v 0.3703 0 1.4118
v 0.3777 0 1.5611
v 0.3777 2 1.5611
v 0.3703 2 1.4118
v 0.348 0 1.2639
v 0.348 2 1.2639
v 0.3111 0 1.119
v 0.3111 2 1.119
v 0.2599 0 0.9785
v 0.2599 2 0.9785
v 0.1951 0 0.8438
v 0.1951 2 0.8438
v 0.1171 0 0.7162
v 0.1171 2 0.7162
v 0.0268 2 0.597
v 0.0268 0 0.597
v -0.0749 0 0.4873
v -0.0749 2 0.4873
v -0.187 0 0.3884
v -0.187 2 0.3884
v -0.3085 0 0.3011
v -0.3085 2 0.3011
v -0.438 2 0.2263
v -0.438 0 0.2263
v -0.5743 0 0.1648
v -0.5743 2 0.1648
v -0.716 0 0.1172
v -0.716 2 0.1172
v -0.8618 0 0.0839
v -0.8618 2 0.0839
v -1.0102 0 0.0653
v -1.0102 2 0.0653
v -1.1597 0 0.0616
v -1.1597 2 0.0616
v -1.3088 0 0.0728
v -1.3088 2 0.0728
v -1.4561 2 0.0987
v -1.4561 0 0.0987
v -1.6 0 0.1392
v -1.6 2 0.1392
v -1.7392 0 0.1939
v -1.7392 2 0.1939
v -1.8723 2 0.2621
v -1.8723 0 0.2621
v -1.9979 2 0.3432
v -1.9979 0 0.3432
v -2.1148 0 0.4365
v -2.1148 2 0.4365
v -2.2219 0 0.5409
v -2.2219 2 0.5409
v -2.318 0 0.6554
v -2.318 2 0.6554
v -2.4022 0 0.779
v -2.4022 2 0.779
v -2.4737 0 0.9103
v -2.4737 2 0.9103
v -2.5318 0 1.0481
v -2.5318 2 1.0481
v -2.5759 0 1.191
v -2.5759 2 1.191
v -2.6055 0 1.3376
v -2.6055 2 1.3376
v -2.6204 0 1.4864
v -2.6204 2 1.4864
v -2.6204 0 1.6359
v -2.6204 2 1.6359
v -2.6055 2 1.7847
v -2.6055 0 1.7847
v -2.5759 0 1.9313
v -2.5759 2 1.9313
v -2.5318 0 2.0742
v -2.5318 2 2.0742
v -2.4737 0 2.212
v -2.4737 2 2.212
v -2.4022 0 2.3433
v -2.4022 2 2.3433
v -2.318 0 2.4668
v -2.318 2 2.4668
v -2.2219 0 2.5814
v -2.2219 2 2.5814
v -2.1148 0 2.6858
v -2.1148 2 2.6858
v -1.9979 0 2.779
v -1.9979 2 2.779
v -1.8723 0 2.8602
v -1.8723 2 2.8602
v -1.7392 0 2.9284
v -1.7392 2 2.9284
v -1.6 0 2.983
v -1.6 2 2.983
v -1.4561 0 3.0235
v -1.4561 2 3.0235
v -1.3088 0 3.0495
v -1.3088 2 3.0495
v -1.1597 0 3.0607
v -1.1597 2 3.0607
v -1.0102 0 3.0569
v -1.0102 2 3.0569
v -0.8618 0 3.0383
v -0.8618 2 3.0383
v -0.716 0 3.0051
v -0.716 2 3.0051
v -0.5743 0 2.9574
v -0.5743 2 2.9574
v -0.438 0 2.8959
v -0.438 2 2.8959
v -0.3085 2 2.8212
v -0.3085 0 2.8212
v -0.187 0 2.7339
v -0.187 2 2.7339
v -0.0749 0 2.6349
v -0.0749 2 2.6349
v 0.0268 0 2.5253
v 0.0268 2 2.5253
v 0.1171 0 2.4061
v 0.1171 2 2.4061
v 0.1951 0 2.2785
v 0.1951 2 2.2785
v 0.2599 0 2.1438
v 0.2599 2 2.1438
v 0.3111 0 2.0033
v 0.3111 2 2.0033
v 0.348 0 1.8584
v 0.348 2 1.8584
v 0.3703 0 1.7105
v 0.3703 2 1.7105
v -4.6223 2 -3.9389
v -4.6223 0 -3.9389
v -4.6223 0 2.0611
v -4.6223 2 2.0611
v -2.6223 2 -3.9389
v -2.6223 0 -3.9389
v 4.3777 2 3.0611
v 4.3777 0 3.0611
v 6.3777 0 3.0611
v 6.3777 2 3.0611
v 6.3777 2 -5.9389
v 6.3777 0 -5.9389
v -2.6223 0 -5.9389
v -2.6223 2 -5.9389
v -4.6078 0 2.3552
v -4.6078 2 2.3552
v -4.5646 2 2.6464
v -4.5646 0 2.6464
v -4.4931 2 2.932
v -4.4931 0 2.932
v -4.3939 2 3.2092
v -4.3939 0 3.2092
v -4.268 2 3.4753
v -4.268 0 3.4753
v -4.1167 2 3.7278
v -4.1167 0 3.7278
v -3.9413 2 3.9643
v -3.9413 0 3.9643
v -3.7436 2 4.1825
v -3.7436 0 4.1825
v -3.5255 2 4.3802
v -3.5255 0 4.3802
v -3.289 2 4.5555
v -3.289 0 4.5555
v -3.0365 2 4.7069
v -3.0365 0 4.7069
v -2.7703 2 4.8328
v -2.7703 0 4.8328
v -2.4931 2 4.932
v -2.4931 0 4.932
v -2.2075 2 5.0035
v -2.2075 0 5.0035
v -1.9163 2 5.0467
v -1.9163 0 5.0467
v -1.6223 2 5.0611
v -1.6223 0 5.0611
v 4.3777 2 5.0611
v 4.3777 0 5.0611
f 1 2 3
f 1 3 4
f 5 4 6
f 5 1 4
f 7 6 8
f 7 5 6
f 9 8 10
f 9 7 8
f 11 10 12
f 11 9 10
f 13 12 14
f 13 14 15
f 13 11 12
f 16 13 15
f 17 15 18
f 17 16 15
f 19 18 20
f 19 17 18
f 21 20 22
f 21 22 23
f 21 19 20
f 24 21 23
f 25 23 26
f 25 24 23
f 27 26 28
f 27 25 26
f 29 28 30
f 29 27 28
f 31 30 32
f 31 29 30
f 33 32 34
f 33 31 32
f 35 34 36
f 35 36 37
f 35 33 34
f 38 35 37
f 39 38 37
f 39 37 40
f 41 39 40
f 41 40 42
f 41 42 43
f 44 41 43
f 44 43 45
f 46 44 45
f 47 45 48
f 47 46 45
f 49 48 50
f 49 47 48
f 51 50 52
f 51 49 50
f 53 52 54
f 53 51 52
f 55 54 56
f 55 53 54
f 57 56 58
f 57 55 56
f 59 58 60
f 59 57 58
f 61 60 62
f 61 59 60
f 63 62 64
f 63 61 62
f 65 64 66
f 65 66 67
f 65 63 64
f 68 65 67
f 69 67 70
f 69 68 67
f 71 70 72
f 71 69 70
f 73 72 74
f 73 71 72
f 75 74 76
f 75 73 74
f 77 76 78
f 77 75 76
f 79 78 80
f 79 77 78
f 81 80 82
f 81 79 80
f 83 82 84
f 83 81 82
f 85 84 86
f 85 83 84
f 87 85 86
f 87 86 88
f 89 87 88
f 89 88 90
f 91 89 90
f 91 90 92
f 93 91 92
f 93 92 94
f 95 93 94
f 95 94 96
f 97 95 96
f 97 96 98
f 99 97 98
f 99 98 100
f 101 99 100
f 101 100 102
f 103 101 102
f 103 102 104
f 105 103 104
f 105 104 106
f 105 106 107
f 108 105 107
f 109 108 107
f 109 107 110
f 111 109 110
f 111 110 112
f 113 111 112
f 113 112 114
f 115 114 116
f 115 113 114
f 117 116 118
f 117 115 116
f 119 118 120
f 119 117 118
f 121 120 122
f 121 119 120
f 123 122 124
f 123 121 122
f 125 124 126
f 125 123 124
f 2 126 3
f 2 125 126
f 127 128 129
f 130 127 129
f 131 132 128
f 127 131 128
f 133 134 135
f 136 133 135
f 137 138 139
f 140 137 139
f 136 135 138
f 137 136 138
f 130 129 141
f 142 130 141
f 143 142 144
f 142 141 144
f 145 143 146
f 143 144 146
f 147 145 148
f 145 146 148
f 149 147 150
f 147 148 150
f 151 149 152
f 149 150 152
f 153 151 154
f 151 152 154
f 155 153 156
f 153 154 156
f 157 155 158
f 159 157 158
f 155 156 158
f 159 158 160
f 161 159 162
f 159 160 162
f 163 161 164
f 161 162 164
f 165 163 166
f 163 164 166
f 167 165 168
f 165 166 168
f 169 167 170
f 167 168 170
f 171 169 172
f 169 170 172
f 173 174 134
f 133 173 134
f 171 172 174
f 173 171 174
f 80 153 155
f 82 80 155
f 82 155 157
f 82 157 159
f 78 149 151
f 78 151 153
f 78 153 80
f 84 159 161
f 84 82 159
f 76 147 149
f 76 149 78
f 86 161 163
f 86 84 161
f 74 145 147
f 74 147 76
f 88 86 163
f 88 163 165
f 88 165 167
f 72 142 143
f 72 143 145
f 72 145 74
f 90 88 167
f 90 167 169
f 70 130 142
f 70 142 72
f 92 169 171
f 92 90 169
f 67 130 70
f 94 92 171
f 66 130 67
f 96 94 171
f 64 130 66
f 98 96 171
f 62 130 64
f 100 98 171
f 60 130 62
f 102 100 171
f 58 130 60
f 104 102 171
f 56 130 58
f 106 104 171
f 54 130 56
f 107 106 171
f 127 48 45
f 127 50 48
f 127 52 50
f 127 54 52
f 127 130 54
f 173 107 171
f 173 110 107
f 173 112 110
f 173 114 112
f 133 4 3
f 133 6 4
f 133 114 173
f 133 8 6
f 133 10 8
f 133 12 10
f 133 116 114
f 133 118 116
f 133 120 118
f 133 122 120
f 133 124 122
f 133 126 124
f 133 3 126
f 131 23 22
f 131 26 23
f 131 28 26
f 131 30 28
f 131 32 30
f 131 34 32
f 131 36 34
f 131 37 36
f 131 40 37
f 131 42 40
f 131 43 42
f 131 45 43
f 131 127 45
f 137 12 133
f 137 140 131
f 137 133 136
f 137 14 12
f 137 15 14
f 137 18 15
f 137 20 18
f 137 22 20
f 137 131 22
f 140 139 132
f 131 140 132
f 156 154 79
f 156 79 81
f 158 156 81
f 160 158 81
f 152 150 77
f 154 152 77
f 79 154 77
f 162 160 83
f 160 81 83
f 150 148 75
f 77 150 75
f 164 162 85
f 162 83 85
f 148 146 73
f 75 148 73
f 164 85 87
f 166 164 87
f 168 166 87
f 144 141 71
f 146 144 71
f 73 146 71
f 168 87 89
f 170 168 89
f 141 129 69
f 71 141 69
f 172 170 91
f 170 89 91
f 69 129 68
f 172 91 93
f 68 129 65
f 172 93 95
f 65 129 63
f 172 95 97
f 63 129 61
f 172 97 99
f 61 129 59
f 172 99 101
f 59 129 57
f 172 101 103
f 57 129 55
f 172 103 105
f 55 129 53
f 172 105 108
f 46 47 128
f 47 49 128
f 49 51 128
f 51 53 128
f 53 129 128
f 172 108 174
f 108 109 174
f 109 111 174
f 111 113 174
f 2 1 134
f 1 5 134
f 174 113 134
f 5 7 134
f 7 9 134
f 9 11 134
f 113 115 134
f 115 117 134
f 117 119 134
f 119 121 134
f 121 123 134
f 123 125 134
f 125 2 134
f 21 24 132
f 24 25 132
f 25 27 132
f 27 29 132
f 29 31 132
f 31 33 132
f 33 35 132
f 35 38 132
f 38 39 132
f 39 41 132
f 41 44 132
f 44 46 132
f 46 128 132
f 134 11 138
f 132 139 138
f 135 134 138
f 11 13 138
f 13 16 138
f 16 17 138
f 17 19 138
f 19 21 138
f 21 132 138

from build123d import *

# Parameters (mm, degrees)
SKETCH1_R           = 1.5
BOSS_EXTRUDE1_DEPTH = 2


with BuildPart() as part:
    # Sketch1 → Boss-Extrude1 (new body)
    with BuildSketch(Plane(origin=(0, 0, 0), x_dir=(1, 0, 0), z_dir=(0, 1, 0))):
        with BuildLine():
            Line((6.37772525, 5.938862625), (-2.62227475, 5.938862625))
            Line((-2.62227475, 5.938862625), (-2.62227475, 3.938862625))
            Line((-2.62227475, 3.938862625), (-4.62227475, 3.938862625))
            Line((-4.62227475, 3.938862625), (-4.62227475, -2.061137375))
            ThreePointArc((-4.62227475, -2.061137375), (-3.743595093, -4.182457719), (-1.62227475, -5.061137375))
            Line((-1.62227475, -5.061137375), (4.37772525, -5.061137375))
            Line((4.37772525, -5.061137375), (4.37772525, -3.061137375))
            Line((4.37772525, -3.061137375), (6.37772525, -3.061137375))
            Line((6.37772525, -3.061137375), (6.37772525, 5.938862625))
        make_face()
        with Locations((-1.12227475, -1.561137375)):
            Circle(SKETCH1_R, mode=Mode.SUBTRACT)
    extrude(amount=BOSS_EXTRUDE1_DEPTH)


solid = part.part
